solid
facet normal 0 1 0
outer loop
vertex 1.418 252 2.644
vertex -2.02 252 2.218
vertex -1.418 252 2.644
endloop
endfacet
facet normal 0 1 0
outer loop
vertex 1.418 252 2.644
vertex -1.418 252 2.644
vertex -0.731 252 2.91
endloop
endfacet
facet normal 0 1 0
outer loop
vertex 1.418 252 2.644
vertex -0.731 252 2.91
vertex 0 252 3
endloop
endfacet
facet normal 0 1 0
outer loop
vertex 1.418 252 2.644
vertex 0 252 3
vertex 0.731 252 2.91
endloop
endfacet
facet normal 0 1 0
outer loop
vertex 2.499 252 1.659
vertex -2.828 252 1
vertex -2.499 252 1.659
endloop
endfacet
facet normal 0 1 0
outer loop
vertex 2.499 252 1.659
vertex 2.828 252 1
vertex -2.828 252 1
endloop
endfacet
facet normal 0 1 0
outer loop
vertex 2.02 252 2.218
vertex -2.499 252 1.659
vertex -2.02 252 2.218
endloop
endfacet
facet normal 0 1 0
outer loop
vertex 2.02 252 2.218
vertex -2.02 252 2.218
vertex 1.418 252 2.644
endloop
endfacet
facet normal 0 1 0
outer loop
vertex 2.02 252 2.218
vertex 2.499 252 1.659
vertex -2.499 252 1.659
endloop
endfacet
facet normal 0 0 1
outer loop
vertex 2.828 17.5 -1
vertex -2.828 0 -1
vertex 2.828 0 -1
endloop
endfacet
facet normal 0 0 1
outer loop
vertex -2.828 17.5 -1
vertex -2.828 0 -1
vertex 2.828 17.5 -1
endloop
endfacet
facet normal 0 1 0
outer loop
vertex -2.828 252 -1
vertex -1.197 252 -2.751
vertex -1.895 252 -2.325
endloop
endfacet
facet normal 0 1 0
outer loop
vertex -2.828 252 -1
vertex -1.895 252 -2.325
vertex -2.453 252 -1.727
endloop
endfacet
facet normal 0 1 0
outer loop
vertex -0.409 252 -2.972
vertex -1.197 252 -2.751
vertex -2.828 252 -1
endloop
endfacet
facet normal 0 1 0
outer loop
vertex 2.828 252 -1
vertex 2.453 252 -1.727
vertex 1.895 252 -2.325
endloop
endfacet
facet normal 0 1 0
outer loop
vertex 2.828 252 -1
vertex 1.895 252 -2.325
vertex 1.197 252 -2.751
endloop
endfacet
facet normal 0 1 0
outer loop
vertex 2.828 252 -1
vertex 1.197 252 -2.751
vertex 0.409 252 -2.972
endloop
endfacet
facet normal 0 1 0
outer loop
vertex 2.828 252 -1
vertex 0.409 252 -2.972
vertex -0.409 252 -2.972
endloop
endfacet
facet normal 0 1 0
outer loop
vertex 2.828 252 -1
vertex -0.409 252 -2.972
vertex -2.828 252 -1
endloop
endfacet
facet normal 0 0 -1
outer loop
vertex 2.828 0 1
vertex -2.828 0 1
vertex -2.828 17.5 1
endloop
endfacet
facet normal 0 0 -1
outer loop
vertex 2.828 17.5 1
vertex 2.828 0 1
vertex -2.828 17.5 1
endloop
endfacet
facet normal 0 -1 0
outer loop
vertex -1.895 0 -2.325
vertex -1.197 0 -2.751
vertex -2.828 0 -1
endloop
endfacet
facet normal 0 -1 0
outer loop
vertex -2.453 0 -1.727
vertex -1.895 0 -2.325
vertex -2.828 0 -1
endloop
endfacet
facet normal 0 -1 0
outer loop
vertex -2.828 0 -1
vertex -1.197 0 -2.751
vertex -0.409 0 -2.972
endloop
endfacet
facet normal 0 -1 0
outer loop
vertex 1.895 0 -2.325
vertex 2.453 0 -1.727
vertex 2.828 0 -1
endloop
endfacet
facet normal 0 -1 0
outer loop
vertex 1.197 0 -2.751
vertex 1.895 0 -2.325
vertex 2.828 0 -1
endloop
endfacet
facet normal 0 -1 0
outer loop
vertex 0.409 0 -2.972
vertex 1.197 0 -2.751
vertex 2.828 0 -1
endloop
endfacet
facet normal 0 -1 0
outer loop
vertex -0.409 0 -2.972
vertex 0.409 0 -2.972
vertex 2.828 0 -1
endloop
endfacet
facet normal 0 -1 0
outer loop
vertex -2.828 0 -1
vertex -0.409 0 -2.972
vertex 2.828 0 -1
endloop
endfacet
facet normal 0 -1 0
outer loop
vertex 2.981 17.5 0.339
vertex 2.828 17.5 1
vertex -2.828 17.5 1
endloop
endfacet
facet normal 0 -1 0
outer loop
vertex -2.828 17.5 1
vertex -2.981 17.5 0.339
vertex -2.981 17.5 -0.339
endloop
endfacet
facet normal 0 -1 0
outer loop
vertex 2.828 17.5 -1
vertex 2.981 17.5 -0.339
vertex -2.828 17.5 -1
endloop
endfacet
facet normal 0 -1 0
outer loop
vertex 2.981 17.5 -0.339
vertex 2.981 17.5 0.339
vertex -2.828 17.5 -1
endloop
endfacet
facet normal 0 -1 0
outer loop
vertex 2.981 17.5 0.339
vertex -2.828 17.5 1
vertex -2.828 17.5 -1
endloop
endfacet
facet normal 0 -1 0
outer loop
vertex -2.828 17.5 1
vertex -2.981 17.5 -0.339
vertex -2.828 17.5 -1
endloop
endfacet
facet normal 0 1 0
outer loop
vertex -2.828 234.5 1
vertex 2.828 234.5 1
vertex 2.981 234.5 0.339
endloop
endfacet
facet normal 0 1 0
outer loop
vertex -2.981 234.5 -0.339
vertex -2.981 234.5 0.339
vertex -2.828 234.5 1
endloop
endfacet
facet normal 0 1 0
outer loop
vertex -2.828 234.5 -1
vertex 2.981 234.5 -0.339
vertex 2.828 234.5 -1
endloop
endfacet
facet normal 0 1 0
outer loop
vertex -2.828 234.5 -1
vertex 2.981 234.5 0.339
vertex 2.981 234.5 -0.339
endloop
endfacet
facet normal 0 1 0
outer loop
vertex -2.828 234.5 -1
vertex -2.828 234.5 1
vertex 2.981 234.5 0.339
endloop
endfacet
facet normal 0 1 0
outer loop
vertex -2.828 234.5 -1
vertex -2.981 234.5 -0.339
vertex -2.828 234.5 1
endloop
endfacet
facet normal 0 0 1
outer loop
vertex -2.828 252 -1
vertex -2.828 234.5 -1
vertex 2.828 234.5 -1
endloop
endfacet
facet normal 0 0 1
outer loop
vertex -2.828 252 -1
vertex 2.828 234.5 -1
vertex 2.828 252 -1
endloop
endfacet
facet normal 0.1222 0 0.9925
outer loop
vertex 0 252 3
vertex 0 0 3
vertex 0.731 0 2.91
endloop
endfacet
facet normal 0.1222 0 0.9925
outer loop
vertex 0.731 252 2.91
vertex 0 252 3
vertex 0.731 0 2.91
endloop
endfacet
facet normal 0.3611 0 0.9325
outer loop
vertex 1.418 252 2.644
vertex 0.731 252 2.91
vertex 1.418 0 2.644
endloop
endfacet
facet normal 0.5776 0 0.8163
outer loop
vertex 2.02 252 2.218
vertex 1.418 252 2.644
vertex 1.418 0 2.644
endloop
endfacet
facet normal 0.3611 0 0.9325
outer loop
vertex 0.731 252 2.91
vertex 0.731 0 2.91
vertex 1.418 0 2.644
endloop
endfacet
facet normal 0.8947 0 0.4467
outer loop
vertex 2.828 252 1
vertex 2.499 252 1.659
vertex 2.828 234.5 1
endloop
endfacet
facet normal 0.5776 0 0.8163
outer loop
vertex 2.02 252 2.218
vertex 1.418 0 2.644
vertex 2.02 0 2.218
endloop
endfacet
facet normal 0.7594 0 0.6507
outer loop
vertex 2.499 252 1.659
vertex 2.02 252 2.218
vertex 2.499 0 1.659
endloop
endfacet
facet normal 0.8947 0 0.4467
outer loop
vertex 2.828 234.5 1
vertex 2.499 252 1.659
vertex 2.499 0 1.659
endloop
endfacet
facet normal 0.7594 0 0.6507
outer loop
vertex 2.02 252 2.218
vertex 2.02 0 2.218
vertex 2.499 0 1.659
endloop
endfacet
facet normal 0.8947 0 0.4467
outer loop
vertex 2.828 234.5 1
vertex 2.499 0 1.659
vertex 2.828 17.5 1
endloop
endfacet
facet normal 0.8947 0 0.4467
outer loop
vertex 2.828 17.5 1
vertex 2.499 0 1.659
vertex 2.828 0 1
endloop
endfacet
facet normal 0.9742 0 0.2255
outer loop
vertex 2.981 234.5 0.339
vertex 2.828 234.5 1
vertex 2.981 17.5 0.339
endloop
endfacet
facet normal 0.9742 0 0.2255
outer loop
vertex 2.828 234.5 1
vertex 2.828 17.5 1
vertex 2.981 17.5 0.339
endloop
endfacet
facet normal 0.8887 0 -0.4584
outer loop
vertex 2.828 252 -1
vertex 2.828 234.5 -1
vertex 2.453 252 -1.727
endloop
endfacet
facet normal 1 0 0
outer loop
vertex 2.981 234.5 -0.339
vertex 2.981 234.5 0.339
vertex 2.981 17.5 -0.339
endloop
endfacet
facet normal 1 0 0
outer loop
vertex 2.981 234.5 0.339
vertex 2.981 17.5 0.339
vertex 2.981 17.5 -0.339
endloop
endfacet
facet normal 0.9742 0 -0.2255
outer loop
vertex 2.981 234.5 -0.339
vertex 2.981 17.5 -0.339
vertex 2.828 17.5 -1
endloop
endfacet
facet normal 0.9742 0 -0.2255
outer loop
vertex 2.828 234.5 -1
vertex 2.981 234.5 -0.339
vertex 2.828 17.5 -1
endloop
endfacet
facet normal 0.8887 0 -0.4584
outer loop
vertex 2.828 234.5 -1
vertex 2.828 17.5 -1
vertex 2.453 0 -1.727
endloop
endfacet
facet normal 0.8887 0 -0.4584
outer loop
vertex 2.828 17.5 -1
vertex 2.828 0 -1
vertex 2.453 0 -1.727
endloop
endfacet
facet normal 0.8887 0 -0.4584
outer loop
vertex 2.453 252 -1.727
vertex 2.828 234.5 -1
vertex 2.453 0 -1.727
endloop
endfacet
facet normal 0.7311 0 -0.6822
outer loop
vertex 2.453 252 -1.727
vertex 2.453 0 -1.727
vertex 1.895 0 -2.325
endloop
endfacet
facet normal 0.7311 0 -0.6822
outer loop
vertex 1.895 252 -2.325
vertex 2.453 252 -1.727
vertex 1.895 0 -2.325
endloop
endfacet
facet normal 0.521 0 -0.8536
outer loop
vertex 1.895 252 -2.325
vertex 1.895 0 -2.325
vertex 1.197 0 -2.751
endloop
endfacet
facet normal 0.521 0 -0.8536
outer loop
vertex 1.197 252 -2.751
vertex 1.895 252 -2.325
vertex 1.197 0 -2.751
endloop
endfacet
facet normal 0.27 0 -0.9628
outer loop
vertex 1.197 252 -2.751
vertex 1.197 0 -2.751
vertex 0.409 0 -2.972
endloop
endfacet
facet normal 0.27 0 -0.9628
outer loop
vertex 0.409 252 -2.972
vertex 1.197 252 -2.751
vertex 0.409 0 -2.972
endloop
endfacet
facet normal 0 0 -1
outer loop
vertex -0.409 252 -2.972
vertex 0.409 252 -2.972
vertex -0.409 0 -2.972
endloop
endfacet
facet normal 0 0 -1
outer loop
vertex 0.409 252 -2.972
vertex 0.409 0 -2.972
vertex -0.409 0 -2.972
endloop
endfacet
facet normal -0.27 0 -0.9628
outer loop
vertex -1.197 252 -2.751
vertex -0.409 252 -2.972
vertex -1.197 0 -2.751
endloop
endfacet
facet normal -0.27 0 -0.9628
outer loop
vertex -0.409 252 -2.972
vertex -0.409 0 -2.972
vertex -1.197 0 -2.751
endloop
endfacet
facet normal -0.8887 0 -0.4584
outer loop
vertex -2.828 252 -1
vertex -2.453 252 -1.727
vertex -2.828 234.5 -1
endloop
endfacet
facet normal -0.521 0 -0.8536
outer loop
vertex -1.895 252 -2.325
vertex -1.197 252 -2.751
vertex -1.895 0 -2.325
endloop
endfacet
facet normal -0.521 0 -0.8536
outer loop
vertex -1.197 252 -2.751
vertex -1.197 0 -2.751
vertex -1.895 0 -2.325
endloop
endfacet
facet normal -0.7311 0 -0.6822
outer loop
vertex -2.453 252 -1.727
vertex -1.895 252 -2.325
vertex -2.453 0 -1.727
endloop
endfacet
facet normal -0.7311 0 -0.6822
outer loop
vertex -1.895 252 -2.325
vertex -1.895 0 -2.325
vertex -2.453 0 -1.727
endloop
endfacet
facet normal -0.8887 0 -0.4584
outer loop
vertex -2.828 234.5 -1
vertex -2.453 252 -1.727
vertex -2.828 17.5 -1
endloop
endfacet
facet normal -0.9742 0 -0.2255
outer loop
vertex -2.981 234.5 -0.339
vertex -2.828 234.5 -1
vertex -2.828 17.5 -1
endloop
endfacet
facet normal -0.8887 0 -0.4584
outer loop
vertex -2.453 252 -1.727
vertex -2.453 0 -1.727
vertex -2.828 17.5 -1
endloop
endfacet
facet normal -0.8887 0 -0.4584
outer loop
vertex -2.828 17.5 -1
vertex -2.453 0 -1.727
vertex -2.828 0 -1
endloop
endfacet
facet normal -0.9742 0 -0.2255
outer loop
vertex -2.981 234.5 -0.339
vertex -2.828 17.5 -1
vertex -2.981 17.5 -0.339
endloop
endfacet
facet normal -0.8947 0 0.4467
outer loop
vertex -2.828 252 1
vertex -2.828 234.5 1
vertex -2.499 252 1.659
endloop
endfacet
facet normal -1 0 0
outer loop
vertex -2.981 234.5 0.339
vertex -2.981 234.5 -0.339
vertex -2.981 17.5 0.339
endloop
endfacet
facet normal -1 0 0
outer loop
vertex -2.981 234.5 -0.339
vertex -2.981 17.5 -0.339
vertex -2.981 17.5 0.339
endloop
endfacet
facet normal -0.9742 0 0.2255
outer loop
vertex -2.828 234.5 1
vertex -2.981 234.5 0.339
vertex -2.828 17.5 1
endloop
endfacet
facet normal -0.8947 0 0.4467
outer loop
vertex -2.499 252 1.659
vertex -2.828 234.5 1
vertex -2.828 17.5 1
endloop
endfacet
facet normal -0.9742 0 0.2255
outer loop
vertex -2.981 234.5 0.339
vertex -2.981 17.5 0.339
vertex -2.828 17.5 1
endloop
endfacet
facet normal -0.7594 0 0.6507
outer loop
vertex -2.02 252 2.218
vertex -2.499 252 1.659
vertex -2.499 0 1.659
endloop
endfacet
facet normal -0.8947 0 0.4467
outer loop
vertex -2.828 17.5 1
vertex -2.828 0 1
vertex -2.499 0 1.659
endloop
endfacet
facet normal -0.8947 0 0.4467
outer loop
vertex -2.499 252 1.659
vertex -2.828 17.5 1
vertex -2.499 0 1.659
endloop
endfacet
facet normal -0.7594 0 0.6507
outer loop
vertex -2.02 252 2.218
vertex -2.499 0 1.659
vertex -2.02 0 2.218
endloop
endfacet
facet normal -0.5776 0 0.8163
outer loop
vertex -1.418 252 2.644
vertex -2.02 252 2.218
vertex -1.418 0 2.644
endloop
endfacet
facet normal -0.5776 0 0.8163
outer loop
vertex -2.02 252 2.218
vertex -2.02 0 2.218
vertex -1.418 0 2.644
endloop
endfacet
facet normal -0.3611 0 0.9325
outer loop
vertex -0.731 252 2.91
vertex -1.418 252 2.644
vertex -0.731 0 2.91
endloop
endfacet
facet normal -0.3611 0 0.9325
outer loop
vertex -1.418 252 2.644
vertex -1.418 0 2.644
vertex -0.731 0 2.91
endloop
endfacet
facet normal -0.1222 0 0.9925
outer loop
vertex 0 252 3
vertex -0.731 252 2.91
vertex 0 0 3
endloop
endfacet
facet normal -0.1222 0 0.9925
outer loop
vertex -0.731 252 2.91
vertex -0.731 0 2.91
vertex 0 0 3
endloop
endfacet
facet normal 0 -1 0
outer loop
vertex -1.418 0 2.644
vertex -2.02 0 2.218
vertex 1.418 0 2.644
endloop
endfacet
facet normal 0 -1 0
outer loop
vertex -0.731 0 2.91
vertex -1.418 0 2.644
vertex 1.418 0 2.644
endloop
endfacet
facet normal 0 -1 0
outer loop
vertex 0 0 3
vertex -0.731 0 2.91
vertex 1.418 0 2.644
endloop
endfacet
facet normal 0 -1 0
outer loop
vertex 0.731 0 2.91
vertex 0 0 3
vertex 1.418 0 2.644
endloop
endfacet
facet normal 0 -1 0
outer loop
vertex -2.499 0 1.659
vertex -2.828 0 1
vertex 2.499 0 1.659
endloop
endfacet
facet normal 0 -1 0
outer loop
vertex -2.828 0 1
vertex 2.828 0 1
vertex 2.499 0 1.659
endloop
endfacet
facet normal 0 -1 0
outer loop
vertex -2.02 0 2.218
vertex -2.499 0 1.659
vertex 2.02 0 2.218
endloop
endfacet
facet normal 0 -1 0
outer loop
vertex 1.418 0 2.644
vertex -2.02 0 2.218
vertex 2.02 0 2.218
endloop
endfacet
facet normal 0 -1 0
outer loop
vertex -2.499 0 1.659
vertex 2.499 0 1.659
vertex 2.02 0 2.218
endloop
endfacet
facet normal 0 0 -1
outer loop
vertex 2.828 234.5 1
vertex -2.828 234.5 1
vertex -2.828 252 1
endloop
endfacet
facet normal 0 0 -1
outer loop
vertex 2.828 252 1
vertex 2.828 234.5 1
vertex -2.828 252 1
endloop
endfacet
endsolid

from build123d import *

# Parameters (mm, degrees)
SKETCH1_R               = 3
BOSS_EXTRUDE1_DEPTH     = 252
CUT_EXTRUDE2_DEPTH      = 253.035711755
CUT_EXTRUDE2_DEPTH_BACK = 253.035711755
SKETCH2_W               = 2
SKETCH2_H               = 17.5


with BuildPart() as part:
    # Sketch1 → Boss-Extrude1 (new body)
    with BuildSketch(Plane(origin=(0, 0, 0), x_dir=(1, 0, 0), z_dir=(0, 1, 0))):
        with Locations(Location((0, 0, 0), (0, 0, 270))):
            Circle(SKETCH1_R)
    extrude(amount=BOSS_EXTRUDE1_DEPTH)

    # Sketch2 → Cut-Extrude2 (cut, two sides: drawn at the far end of the back side and taken through both)
    with BuildSketch(Plane(origin=(0, 0, 0), x_dir=(0, 0, -1), z_dir=(1, 0, 0)).offset(-CUT_EXTRUDE2_DEPTH_BACK)):
        with Locations((0, 243.25)):
            Rectangle(SKETCH2_W, SKETCH2_H)
        with Locations((0, 8.75)):
            Rectangle(SKETCH2_W, SKETCH2_H)
    extrude(amount=CUT_EXTRUDE2_DEPTH + CUT_EXTRUDE2_DEPTH_BACK, mode=Mode.SUBTRACT)


solid = part.part
